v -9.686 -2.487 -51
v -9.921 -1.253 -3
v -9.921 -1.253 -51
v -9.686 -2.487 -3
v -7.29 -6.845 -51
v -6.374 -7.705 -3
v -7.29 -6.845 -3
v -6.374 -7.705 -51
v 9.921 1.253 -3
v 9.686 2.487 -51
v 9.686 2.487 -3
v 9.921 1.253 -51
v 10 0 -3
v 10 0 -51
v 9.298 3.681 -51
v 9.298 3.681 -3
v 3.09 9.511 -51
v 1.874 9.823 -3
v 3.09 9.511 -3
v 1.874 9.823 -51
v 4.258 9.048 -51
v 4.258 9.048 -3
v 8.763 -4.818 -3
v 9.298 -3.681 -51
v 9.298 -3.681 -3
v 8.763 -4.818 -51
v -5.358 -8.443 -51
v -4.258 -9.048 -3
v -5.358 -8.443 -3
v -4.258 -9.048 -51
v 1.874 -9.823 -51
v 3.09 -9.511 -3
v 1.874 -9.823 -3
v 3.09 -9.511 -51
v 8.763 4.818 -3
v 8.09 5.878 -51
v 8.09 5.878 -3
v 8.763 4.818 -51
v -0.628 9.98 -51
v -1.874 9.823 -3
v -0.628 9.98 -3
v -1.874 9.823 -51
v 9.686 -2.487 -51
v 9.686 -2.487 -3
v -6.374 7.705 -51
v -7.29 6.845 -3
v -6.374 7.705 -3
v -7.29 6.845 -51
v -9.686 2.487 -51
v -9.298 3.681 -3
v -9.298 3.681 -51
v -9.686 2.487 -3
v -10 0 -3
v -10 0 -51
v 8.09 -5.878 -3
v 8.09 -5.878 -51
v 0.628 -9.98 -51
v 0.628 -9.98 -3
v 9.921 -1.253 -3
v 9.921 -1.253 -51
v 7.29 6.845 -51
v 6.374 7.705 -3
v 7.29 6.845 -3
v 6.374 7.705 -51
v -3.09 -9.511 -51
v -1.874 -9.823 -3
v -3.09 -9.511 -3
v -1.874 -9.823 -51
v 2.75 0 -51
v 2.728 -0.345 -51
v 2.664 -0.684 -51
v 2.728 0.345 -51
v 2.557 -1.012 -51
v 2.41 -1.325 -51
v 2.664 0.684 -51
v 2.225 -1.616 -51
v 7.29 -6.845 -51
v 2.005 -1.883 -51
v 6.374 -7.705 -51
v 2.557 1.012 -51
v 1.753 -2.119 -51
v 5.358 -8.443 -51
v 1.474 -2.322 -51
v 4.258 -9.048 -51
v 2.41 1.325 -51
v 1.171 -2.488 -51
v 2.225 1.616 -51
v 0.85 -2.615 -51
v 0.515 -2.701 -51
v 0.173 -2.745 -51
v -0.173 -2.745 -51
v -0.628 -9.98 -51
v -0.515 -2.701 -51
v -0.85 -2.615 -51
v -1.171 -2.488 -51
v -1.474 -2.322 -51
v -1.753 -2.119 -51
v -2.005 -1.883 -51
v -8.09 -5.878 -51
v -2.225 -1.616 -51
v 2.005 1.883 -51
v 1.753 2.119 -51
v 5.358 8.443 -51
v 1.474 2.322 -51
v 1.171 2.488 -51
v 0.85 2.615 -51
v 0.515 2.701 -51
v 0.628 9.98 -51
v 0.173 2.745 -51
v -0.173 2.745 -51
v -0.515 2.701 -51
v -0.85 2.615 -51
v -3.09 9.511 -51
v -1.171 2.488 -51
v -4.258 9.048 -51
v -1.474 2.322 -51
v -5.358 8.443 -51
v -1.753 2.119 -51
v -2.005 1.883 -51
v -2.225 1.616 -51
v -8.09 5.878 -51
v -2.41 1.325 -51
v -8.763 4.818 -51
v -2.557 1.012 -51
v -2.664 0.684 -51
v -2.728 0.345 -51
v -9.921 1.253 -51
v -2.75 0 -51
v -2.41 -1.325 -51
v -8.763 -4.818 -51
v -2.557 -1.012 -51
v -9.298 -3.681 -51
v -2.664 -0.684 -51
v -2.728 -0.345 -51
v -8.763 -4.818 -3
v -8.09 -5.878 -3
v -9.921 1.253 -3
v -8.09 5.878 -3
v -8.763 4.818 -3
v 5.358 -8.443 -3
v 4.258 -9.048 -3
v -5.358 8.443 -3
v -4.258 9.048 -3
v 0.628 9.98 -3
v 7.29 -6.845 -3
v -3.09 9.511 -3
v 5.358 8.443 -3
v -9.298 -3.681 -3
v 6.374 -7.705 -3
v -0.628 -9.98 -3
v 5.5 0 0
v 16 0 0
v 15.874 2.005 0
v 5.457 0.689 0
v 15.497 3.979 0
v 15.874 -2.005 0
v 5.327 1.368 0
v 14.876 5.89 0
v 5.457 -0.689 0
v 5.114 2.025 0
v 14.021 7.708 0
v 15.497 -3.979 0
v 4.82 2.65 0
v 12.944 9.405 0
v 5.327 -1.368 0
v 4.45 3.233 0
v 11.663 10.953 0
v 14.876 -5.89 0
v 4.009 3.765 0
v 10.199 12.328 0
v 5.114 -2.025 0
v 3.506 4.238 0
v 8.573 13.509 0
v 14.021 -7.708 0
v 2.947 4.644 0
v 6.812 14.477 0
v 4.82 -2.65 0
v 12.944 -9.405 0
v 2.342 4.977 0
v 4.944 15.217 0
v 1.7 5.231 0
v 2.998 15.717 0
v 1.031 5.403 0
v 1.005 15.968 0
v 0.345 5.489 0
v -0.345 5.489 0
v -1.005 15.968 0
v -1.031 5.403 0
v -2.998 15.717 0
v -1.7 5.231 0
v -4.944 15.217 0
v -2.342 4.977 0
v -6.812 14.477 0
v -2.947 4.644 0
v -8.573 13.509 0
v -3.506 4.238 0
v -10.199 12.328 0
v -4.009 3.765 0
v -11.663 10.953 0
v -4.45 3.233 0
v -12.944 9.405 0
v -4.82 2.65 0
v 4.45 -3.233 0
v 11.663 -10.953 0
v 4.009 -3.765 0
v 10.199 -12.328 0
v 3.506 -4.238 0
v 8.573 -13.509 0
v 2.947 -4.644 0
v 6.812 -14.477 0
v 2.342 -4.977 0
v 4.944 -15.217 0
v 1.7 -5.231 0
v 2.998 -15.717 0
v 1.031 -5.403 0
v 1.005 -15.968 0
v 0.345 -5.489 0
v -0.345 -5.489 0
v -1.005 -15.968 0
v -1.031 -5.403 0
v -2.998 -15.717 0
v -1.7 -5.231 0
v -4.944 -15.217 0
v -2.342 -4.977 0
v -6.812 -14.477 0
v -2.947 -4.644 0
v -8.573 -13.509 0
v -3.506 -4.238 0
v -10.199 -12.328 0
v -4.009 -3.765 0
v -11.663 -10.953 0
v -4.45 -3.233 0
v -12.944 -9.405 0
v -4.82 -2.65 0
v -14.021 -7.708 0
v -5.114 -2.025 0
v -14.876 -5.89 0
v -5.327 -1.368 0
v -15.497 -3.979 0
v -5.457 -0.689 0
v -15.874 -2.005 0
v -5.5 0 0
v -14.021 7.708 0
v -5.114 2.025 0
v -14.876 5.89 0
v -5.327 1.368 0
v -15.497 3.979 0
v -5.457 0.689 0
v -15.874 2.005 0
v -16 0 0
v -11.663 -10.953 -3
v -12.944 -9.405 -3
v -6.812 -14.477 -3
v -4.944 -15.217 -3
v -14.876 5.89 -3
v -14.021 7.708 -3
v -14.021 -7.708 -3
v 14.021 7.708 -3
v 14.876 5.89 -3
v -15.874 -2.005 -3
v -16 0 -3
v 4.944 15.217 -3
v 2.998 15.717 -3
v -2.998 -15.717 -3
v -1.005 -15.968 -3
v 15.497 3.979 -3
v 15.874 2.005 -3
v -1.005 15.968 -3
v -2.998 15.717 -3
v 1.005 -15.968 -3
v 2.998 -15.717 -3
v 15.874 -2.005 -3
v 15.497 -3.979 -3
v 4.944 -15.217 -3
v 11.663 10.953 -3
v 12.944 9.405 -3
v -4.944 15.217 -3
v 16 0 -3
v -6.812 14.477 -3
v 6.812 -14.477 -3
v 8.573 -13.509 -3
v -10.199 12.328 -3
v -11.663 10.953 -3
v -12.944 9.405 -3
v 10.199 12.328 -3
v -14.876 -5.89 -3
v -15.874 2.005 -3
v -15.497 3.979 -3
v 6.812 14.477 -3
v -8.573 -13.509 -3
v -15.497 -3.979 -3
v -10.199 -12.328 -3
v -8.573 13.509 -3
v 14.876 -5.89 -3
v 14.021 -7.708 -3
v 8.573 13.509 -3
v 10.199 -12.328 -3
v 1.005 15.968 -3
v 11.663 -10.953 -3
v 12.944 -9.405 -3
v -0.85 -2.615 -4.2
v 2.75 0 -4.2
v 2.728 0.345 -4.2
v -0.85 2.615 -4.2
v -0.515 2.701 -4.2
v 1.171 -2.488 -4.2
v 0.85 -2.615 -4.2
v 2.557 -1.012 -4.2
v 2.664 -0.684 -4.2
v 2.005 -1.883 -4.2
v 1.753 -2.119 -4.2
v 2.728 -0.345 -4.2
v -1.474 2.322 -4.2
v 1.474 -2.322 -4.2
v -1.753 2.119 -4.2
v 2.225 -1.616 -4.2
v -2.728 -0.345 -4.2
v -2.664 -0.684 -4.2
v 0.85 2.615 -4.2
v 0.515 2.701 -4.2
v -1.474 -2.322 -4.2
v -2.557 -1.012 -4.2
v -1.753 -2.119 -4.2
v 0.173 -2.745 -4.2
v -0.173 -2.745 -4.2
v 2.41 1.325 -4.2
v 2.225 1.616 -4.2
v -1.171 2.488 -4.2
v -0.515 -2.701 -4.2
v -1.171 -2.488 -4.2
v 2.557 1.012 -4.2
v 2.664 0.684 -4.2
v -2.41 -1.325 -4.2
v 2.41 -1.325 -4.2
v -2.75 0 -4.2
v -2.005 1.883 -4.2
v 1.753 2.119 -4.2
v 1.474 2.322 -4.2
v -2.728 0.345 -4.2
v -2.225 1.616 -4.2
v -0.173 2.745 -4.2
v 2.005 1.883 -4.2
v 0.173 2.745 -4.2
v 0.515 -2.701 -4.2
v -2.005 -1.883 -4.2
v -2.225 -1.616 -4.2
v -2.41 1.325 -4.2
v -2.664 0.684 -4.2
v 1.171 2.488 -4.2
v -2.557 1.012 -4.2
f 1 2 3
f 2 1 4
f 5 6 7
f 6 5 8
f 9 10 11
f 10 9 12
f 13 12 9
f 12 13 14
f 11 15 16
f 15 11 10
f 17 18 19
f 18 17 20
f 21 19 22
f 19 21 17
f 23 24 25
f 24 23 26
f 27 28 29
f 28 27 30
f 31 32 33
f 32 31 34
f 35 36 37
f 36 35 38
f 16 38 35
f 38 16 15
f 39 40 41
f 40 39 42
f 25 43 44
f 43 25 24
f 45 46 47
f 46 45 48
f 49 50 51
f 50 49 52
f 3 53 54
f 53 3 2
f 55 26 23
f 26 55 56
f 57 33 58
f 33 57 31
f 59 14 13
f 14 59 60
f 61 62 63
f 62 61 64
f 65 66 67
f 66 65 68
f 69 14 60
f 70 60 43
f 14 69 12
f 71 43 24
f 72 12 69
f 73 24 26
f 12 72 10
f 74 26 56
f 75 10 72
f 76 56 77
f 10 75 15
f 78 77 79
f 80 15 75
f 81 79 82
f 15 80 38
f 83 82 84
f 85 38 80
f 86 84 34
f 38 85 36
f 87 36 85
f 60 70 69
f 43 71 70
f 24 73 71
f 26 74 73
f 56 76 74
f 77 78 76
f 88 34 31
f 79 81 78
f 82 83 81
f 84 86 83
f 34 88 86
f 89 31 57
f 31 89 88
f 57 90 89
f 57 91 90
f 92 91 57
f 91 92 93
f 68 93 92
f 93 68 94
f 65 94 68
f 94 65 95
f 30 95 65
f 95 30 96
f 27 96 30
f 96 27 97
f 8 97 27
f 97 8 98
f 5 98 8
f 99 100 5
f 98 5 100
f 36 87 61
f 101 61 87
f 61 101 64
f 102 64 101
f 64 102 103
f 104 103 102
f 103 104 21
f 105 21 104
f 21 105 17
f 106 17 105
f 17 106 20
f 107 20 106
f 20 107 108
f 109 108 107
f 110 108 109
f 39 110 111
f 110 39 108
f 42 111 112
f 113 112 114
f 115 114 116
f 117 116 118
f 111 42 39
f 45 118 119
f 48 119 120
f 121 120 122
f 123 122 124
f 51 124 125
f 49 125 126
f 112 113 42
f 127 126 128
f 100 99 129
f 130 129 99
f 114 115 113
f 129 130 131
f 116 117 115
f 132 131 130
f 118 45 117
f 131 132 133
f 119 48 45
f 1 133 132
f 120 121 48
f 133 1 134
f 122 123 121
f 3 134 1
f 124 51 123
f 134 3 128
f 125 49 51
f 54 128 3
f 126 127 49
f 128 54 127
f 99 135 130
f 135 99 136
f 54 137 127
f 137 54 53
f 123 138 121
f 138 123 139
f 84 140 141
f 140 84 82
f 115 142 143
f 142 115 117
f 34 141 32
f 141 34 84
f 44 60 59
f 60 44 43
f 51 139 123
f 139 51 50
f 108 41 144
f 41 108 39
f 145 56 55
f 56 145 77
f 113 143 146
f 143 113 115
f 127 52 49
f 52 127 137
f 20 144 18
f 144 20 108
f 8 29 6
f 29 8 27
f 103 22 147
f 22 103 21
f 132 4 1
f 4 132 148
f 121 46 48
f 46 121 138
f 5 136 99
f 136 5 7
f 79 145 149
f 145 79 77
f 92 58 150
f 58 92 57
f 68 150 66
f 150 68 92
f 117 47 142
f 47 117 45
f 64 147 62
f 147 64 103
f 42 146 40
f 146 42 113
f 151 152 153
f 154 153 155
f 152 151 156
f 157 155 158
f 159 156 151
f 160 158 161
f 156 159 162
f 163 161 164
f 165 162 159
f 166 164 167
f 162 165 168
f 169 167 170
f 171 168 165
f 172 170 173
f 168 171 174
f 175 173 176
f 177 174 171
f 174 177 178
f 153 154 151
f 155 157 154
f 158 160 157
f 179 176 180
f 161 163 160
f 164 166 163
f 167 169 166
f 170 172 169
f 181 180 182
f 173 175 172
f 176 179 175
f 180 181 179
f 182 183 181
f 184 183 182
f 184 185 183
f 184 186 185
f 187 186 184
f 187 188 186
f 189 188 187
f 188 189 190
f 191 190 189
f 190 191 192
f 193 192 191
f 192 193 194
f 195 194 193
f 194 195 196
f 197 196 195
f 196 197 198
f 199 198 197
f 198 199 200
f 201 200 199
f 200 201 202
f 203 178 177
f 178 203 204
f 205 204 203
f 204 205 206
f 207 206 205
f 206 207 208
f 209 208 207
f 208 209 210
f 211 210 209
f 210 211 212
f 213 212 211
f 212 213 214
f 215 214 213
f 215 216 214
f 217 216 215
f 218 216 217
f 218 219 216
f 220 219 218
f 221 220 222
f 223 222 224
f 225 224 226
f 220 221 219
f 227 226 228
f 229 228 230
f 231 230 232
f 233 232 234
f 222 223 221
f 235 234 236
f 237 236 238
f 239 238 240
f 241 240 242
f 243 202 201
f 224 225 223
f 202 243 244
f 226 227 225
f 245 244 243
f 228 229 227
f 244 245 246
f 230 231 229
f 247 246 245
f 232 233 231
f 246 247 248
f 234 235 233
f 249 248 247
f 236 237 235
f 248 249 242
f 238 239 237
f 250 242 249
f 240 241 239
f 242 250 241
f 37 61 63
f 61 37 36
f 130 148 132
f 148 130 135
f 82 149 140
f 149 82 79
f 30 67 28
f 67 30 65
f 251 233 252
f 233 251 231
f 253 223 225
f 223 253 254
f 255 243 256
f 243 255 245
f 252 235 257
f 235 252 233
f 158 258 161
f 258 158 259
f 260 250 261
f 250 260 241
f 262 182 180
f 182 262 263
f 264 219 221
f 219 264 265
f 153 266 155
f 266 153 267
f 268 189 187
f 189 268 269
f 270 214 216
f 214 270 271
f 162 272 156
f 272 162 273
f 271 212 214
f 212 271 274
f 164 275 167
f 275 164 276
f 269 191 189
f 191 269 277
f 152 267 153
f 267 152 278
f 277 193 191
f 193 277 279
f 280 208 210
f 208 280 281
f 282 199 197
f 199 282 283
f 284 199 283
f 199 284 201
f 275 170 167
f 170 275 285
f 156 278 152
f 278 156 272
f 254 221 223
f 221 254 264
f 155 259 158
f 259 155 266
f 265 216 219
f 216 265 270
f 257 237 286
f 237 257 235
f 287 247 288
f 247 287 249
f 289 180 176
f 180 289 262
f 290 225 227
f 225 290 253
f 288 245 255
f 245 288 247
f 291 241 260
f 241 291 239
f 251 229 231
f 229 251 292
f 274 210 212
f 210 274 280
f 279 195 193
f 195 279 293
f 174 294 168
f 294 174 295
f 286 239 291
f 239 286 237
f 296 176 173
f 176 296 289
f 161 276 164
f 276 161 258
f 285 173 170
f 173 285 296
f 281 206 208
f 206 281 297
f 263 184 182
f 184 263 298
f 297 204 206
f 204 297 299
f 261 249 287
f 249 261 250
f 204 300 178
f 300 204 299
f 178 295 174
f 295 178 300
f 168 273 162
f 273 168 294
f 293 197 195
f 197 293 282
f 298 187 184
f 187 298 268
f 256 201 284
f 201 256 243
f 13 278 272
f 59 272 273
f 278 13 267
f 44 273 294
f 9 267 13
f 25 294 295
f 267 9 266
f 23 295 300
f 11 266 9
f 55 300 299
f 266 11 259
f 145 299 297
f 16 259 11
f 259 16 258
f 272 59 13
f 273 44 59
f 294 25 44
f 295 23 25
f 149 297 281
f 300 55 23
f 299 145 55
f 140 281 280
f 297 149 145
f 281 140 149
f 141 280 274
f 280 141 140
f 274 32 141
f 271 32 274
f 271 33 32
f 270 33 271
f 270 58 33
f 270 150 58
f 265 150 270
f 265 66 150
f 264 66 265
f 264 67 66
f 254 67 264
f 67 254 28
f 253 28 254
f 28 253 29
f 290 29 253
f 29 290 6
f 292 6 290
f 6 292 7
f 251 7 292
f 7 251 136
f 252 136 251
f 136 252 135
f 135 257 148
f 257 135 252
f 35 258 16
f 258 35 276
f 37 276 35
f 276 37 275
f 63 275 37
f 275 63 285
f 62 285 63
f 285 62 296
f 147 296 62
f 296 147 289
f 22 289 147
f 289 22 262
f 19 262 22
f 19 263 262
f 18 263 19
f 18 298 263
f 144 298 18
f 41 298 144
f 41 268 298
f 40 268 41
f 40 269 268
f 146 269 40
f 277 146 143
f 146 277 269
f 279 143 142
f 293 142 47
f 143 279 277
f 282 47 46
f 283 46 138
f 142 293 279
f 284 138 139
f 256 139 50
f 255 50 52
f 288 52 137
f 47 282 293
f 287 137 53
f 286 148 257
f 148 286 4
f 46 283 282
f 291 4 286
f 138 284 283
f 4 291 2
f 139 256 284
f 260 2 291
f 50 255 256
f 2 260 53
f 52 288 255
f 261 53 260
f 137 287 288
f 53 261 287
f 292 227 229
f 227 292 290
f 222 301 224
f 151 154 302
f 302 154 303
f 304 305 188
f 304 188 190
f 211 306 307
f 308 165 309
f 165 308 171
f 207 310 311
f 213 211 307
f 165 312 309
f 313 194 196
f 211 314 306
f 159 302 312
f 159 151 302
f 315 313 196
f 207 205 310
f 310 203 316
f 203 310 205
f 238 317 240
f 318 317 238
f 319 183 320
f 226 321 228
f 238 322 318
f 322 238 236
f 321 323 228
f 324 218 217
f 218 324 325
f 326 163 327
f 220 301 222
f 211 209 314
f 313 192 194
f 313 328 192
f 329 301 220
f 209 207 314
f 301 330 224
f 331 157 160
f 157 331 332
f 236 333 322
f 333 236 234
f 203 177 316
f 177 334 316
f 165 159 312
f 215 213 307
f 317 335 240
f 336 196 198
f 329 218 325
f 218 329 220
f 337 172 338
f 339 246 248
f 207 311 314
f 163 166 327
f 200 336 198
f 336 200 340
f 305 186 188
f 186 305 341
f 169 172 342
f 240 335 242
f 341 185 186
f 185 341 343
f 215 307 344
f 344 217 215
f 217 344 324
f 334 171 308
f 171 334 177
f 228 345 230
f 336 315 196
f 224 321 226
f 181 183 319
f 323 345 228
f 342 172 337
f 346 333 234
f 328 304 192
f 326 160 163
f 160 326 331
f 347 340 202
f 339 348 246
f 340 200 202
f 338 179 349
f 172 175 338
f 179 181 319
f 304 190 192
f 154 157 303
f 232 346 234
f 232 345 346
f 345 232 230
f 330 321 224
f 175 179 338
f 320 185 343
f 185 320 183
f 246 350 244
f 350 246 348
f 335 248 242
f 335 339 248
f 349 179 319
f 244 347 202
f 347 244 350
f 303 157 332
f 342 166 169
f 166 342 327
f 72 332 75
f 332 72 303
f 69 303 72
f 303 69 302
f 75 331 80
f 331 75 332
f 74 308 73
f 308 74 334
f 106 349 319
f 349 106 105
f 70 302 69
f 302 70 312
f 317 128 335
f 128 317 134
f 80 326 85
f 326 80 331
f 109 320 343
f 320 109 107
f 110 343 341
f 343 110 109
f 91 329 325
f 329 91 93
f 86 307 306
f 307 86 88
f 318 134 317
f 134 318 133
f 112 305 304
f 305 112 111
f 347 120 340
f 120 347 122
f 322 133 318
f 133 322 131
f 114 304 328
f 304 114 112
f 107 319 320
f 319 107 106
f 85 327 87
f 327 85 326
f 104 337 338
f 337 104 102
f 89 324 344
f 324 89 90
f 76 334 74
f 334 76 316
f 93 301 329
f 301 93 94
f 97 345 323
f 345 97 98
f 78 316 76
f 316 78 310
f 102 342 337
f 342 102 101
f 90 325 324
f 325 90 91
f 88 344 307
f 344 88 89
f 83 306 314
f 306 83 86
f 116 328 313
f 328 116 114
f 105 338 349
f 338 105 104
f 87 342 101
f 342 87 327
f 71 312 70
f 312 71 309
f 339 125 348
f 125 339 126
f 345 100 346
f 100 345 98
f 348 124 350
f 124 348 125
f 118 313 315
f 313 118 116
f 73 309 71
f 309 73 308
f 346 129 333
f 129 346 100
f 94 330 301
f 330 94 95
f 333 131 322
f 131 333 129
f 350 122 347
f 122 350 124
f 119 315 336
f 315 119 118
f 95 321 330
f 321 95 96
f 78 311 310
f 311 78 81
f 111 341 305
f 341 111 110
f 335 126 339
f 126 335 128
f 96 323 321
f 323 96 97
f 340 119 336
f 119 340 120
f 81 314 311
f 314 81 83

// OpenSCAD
$fn = 50;


difference() {
	union() {
		translate(v = [0, 0, -51.0000000000]) {
			cylinder(h = 51, r = 10.0000000000);
		}
		translate(v = [0, 0, -3.0000000000]) {
			cylinder(h = 3, r = 16.0000000000);
		}
	}
	union() {
		translate(v = [0, 0, 0]) {
			rotate(a = [0, 0, 0]) {
				difference() {
					union() {
						#translate(v = [0, 0, -51.0000000000]) {
							cylinder(h = 51, r = 2.2500000000);
						}
						#translate(v = [0, 0, -4.2000000000]) {
							cylinder(h = 4.2000000000, r1 = 2.7500000000, r2 = 5.5000000000);
						}
						#translate(v = [0, 0, -51.0000000000]) {
							cylinder(h = 51, r = 2.7500000000);
						}
						#translate(v = [0, 0, -51.0000000000]) {
							cylinder(h = 51, r = 2.2500000000);
						}
					}
					union();
				}
			}
		}
	}
}
